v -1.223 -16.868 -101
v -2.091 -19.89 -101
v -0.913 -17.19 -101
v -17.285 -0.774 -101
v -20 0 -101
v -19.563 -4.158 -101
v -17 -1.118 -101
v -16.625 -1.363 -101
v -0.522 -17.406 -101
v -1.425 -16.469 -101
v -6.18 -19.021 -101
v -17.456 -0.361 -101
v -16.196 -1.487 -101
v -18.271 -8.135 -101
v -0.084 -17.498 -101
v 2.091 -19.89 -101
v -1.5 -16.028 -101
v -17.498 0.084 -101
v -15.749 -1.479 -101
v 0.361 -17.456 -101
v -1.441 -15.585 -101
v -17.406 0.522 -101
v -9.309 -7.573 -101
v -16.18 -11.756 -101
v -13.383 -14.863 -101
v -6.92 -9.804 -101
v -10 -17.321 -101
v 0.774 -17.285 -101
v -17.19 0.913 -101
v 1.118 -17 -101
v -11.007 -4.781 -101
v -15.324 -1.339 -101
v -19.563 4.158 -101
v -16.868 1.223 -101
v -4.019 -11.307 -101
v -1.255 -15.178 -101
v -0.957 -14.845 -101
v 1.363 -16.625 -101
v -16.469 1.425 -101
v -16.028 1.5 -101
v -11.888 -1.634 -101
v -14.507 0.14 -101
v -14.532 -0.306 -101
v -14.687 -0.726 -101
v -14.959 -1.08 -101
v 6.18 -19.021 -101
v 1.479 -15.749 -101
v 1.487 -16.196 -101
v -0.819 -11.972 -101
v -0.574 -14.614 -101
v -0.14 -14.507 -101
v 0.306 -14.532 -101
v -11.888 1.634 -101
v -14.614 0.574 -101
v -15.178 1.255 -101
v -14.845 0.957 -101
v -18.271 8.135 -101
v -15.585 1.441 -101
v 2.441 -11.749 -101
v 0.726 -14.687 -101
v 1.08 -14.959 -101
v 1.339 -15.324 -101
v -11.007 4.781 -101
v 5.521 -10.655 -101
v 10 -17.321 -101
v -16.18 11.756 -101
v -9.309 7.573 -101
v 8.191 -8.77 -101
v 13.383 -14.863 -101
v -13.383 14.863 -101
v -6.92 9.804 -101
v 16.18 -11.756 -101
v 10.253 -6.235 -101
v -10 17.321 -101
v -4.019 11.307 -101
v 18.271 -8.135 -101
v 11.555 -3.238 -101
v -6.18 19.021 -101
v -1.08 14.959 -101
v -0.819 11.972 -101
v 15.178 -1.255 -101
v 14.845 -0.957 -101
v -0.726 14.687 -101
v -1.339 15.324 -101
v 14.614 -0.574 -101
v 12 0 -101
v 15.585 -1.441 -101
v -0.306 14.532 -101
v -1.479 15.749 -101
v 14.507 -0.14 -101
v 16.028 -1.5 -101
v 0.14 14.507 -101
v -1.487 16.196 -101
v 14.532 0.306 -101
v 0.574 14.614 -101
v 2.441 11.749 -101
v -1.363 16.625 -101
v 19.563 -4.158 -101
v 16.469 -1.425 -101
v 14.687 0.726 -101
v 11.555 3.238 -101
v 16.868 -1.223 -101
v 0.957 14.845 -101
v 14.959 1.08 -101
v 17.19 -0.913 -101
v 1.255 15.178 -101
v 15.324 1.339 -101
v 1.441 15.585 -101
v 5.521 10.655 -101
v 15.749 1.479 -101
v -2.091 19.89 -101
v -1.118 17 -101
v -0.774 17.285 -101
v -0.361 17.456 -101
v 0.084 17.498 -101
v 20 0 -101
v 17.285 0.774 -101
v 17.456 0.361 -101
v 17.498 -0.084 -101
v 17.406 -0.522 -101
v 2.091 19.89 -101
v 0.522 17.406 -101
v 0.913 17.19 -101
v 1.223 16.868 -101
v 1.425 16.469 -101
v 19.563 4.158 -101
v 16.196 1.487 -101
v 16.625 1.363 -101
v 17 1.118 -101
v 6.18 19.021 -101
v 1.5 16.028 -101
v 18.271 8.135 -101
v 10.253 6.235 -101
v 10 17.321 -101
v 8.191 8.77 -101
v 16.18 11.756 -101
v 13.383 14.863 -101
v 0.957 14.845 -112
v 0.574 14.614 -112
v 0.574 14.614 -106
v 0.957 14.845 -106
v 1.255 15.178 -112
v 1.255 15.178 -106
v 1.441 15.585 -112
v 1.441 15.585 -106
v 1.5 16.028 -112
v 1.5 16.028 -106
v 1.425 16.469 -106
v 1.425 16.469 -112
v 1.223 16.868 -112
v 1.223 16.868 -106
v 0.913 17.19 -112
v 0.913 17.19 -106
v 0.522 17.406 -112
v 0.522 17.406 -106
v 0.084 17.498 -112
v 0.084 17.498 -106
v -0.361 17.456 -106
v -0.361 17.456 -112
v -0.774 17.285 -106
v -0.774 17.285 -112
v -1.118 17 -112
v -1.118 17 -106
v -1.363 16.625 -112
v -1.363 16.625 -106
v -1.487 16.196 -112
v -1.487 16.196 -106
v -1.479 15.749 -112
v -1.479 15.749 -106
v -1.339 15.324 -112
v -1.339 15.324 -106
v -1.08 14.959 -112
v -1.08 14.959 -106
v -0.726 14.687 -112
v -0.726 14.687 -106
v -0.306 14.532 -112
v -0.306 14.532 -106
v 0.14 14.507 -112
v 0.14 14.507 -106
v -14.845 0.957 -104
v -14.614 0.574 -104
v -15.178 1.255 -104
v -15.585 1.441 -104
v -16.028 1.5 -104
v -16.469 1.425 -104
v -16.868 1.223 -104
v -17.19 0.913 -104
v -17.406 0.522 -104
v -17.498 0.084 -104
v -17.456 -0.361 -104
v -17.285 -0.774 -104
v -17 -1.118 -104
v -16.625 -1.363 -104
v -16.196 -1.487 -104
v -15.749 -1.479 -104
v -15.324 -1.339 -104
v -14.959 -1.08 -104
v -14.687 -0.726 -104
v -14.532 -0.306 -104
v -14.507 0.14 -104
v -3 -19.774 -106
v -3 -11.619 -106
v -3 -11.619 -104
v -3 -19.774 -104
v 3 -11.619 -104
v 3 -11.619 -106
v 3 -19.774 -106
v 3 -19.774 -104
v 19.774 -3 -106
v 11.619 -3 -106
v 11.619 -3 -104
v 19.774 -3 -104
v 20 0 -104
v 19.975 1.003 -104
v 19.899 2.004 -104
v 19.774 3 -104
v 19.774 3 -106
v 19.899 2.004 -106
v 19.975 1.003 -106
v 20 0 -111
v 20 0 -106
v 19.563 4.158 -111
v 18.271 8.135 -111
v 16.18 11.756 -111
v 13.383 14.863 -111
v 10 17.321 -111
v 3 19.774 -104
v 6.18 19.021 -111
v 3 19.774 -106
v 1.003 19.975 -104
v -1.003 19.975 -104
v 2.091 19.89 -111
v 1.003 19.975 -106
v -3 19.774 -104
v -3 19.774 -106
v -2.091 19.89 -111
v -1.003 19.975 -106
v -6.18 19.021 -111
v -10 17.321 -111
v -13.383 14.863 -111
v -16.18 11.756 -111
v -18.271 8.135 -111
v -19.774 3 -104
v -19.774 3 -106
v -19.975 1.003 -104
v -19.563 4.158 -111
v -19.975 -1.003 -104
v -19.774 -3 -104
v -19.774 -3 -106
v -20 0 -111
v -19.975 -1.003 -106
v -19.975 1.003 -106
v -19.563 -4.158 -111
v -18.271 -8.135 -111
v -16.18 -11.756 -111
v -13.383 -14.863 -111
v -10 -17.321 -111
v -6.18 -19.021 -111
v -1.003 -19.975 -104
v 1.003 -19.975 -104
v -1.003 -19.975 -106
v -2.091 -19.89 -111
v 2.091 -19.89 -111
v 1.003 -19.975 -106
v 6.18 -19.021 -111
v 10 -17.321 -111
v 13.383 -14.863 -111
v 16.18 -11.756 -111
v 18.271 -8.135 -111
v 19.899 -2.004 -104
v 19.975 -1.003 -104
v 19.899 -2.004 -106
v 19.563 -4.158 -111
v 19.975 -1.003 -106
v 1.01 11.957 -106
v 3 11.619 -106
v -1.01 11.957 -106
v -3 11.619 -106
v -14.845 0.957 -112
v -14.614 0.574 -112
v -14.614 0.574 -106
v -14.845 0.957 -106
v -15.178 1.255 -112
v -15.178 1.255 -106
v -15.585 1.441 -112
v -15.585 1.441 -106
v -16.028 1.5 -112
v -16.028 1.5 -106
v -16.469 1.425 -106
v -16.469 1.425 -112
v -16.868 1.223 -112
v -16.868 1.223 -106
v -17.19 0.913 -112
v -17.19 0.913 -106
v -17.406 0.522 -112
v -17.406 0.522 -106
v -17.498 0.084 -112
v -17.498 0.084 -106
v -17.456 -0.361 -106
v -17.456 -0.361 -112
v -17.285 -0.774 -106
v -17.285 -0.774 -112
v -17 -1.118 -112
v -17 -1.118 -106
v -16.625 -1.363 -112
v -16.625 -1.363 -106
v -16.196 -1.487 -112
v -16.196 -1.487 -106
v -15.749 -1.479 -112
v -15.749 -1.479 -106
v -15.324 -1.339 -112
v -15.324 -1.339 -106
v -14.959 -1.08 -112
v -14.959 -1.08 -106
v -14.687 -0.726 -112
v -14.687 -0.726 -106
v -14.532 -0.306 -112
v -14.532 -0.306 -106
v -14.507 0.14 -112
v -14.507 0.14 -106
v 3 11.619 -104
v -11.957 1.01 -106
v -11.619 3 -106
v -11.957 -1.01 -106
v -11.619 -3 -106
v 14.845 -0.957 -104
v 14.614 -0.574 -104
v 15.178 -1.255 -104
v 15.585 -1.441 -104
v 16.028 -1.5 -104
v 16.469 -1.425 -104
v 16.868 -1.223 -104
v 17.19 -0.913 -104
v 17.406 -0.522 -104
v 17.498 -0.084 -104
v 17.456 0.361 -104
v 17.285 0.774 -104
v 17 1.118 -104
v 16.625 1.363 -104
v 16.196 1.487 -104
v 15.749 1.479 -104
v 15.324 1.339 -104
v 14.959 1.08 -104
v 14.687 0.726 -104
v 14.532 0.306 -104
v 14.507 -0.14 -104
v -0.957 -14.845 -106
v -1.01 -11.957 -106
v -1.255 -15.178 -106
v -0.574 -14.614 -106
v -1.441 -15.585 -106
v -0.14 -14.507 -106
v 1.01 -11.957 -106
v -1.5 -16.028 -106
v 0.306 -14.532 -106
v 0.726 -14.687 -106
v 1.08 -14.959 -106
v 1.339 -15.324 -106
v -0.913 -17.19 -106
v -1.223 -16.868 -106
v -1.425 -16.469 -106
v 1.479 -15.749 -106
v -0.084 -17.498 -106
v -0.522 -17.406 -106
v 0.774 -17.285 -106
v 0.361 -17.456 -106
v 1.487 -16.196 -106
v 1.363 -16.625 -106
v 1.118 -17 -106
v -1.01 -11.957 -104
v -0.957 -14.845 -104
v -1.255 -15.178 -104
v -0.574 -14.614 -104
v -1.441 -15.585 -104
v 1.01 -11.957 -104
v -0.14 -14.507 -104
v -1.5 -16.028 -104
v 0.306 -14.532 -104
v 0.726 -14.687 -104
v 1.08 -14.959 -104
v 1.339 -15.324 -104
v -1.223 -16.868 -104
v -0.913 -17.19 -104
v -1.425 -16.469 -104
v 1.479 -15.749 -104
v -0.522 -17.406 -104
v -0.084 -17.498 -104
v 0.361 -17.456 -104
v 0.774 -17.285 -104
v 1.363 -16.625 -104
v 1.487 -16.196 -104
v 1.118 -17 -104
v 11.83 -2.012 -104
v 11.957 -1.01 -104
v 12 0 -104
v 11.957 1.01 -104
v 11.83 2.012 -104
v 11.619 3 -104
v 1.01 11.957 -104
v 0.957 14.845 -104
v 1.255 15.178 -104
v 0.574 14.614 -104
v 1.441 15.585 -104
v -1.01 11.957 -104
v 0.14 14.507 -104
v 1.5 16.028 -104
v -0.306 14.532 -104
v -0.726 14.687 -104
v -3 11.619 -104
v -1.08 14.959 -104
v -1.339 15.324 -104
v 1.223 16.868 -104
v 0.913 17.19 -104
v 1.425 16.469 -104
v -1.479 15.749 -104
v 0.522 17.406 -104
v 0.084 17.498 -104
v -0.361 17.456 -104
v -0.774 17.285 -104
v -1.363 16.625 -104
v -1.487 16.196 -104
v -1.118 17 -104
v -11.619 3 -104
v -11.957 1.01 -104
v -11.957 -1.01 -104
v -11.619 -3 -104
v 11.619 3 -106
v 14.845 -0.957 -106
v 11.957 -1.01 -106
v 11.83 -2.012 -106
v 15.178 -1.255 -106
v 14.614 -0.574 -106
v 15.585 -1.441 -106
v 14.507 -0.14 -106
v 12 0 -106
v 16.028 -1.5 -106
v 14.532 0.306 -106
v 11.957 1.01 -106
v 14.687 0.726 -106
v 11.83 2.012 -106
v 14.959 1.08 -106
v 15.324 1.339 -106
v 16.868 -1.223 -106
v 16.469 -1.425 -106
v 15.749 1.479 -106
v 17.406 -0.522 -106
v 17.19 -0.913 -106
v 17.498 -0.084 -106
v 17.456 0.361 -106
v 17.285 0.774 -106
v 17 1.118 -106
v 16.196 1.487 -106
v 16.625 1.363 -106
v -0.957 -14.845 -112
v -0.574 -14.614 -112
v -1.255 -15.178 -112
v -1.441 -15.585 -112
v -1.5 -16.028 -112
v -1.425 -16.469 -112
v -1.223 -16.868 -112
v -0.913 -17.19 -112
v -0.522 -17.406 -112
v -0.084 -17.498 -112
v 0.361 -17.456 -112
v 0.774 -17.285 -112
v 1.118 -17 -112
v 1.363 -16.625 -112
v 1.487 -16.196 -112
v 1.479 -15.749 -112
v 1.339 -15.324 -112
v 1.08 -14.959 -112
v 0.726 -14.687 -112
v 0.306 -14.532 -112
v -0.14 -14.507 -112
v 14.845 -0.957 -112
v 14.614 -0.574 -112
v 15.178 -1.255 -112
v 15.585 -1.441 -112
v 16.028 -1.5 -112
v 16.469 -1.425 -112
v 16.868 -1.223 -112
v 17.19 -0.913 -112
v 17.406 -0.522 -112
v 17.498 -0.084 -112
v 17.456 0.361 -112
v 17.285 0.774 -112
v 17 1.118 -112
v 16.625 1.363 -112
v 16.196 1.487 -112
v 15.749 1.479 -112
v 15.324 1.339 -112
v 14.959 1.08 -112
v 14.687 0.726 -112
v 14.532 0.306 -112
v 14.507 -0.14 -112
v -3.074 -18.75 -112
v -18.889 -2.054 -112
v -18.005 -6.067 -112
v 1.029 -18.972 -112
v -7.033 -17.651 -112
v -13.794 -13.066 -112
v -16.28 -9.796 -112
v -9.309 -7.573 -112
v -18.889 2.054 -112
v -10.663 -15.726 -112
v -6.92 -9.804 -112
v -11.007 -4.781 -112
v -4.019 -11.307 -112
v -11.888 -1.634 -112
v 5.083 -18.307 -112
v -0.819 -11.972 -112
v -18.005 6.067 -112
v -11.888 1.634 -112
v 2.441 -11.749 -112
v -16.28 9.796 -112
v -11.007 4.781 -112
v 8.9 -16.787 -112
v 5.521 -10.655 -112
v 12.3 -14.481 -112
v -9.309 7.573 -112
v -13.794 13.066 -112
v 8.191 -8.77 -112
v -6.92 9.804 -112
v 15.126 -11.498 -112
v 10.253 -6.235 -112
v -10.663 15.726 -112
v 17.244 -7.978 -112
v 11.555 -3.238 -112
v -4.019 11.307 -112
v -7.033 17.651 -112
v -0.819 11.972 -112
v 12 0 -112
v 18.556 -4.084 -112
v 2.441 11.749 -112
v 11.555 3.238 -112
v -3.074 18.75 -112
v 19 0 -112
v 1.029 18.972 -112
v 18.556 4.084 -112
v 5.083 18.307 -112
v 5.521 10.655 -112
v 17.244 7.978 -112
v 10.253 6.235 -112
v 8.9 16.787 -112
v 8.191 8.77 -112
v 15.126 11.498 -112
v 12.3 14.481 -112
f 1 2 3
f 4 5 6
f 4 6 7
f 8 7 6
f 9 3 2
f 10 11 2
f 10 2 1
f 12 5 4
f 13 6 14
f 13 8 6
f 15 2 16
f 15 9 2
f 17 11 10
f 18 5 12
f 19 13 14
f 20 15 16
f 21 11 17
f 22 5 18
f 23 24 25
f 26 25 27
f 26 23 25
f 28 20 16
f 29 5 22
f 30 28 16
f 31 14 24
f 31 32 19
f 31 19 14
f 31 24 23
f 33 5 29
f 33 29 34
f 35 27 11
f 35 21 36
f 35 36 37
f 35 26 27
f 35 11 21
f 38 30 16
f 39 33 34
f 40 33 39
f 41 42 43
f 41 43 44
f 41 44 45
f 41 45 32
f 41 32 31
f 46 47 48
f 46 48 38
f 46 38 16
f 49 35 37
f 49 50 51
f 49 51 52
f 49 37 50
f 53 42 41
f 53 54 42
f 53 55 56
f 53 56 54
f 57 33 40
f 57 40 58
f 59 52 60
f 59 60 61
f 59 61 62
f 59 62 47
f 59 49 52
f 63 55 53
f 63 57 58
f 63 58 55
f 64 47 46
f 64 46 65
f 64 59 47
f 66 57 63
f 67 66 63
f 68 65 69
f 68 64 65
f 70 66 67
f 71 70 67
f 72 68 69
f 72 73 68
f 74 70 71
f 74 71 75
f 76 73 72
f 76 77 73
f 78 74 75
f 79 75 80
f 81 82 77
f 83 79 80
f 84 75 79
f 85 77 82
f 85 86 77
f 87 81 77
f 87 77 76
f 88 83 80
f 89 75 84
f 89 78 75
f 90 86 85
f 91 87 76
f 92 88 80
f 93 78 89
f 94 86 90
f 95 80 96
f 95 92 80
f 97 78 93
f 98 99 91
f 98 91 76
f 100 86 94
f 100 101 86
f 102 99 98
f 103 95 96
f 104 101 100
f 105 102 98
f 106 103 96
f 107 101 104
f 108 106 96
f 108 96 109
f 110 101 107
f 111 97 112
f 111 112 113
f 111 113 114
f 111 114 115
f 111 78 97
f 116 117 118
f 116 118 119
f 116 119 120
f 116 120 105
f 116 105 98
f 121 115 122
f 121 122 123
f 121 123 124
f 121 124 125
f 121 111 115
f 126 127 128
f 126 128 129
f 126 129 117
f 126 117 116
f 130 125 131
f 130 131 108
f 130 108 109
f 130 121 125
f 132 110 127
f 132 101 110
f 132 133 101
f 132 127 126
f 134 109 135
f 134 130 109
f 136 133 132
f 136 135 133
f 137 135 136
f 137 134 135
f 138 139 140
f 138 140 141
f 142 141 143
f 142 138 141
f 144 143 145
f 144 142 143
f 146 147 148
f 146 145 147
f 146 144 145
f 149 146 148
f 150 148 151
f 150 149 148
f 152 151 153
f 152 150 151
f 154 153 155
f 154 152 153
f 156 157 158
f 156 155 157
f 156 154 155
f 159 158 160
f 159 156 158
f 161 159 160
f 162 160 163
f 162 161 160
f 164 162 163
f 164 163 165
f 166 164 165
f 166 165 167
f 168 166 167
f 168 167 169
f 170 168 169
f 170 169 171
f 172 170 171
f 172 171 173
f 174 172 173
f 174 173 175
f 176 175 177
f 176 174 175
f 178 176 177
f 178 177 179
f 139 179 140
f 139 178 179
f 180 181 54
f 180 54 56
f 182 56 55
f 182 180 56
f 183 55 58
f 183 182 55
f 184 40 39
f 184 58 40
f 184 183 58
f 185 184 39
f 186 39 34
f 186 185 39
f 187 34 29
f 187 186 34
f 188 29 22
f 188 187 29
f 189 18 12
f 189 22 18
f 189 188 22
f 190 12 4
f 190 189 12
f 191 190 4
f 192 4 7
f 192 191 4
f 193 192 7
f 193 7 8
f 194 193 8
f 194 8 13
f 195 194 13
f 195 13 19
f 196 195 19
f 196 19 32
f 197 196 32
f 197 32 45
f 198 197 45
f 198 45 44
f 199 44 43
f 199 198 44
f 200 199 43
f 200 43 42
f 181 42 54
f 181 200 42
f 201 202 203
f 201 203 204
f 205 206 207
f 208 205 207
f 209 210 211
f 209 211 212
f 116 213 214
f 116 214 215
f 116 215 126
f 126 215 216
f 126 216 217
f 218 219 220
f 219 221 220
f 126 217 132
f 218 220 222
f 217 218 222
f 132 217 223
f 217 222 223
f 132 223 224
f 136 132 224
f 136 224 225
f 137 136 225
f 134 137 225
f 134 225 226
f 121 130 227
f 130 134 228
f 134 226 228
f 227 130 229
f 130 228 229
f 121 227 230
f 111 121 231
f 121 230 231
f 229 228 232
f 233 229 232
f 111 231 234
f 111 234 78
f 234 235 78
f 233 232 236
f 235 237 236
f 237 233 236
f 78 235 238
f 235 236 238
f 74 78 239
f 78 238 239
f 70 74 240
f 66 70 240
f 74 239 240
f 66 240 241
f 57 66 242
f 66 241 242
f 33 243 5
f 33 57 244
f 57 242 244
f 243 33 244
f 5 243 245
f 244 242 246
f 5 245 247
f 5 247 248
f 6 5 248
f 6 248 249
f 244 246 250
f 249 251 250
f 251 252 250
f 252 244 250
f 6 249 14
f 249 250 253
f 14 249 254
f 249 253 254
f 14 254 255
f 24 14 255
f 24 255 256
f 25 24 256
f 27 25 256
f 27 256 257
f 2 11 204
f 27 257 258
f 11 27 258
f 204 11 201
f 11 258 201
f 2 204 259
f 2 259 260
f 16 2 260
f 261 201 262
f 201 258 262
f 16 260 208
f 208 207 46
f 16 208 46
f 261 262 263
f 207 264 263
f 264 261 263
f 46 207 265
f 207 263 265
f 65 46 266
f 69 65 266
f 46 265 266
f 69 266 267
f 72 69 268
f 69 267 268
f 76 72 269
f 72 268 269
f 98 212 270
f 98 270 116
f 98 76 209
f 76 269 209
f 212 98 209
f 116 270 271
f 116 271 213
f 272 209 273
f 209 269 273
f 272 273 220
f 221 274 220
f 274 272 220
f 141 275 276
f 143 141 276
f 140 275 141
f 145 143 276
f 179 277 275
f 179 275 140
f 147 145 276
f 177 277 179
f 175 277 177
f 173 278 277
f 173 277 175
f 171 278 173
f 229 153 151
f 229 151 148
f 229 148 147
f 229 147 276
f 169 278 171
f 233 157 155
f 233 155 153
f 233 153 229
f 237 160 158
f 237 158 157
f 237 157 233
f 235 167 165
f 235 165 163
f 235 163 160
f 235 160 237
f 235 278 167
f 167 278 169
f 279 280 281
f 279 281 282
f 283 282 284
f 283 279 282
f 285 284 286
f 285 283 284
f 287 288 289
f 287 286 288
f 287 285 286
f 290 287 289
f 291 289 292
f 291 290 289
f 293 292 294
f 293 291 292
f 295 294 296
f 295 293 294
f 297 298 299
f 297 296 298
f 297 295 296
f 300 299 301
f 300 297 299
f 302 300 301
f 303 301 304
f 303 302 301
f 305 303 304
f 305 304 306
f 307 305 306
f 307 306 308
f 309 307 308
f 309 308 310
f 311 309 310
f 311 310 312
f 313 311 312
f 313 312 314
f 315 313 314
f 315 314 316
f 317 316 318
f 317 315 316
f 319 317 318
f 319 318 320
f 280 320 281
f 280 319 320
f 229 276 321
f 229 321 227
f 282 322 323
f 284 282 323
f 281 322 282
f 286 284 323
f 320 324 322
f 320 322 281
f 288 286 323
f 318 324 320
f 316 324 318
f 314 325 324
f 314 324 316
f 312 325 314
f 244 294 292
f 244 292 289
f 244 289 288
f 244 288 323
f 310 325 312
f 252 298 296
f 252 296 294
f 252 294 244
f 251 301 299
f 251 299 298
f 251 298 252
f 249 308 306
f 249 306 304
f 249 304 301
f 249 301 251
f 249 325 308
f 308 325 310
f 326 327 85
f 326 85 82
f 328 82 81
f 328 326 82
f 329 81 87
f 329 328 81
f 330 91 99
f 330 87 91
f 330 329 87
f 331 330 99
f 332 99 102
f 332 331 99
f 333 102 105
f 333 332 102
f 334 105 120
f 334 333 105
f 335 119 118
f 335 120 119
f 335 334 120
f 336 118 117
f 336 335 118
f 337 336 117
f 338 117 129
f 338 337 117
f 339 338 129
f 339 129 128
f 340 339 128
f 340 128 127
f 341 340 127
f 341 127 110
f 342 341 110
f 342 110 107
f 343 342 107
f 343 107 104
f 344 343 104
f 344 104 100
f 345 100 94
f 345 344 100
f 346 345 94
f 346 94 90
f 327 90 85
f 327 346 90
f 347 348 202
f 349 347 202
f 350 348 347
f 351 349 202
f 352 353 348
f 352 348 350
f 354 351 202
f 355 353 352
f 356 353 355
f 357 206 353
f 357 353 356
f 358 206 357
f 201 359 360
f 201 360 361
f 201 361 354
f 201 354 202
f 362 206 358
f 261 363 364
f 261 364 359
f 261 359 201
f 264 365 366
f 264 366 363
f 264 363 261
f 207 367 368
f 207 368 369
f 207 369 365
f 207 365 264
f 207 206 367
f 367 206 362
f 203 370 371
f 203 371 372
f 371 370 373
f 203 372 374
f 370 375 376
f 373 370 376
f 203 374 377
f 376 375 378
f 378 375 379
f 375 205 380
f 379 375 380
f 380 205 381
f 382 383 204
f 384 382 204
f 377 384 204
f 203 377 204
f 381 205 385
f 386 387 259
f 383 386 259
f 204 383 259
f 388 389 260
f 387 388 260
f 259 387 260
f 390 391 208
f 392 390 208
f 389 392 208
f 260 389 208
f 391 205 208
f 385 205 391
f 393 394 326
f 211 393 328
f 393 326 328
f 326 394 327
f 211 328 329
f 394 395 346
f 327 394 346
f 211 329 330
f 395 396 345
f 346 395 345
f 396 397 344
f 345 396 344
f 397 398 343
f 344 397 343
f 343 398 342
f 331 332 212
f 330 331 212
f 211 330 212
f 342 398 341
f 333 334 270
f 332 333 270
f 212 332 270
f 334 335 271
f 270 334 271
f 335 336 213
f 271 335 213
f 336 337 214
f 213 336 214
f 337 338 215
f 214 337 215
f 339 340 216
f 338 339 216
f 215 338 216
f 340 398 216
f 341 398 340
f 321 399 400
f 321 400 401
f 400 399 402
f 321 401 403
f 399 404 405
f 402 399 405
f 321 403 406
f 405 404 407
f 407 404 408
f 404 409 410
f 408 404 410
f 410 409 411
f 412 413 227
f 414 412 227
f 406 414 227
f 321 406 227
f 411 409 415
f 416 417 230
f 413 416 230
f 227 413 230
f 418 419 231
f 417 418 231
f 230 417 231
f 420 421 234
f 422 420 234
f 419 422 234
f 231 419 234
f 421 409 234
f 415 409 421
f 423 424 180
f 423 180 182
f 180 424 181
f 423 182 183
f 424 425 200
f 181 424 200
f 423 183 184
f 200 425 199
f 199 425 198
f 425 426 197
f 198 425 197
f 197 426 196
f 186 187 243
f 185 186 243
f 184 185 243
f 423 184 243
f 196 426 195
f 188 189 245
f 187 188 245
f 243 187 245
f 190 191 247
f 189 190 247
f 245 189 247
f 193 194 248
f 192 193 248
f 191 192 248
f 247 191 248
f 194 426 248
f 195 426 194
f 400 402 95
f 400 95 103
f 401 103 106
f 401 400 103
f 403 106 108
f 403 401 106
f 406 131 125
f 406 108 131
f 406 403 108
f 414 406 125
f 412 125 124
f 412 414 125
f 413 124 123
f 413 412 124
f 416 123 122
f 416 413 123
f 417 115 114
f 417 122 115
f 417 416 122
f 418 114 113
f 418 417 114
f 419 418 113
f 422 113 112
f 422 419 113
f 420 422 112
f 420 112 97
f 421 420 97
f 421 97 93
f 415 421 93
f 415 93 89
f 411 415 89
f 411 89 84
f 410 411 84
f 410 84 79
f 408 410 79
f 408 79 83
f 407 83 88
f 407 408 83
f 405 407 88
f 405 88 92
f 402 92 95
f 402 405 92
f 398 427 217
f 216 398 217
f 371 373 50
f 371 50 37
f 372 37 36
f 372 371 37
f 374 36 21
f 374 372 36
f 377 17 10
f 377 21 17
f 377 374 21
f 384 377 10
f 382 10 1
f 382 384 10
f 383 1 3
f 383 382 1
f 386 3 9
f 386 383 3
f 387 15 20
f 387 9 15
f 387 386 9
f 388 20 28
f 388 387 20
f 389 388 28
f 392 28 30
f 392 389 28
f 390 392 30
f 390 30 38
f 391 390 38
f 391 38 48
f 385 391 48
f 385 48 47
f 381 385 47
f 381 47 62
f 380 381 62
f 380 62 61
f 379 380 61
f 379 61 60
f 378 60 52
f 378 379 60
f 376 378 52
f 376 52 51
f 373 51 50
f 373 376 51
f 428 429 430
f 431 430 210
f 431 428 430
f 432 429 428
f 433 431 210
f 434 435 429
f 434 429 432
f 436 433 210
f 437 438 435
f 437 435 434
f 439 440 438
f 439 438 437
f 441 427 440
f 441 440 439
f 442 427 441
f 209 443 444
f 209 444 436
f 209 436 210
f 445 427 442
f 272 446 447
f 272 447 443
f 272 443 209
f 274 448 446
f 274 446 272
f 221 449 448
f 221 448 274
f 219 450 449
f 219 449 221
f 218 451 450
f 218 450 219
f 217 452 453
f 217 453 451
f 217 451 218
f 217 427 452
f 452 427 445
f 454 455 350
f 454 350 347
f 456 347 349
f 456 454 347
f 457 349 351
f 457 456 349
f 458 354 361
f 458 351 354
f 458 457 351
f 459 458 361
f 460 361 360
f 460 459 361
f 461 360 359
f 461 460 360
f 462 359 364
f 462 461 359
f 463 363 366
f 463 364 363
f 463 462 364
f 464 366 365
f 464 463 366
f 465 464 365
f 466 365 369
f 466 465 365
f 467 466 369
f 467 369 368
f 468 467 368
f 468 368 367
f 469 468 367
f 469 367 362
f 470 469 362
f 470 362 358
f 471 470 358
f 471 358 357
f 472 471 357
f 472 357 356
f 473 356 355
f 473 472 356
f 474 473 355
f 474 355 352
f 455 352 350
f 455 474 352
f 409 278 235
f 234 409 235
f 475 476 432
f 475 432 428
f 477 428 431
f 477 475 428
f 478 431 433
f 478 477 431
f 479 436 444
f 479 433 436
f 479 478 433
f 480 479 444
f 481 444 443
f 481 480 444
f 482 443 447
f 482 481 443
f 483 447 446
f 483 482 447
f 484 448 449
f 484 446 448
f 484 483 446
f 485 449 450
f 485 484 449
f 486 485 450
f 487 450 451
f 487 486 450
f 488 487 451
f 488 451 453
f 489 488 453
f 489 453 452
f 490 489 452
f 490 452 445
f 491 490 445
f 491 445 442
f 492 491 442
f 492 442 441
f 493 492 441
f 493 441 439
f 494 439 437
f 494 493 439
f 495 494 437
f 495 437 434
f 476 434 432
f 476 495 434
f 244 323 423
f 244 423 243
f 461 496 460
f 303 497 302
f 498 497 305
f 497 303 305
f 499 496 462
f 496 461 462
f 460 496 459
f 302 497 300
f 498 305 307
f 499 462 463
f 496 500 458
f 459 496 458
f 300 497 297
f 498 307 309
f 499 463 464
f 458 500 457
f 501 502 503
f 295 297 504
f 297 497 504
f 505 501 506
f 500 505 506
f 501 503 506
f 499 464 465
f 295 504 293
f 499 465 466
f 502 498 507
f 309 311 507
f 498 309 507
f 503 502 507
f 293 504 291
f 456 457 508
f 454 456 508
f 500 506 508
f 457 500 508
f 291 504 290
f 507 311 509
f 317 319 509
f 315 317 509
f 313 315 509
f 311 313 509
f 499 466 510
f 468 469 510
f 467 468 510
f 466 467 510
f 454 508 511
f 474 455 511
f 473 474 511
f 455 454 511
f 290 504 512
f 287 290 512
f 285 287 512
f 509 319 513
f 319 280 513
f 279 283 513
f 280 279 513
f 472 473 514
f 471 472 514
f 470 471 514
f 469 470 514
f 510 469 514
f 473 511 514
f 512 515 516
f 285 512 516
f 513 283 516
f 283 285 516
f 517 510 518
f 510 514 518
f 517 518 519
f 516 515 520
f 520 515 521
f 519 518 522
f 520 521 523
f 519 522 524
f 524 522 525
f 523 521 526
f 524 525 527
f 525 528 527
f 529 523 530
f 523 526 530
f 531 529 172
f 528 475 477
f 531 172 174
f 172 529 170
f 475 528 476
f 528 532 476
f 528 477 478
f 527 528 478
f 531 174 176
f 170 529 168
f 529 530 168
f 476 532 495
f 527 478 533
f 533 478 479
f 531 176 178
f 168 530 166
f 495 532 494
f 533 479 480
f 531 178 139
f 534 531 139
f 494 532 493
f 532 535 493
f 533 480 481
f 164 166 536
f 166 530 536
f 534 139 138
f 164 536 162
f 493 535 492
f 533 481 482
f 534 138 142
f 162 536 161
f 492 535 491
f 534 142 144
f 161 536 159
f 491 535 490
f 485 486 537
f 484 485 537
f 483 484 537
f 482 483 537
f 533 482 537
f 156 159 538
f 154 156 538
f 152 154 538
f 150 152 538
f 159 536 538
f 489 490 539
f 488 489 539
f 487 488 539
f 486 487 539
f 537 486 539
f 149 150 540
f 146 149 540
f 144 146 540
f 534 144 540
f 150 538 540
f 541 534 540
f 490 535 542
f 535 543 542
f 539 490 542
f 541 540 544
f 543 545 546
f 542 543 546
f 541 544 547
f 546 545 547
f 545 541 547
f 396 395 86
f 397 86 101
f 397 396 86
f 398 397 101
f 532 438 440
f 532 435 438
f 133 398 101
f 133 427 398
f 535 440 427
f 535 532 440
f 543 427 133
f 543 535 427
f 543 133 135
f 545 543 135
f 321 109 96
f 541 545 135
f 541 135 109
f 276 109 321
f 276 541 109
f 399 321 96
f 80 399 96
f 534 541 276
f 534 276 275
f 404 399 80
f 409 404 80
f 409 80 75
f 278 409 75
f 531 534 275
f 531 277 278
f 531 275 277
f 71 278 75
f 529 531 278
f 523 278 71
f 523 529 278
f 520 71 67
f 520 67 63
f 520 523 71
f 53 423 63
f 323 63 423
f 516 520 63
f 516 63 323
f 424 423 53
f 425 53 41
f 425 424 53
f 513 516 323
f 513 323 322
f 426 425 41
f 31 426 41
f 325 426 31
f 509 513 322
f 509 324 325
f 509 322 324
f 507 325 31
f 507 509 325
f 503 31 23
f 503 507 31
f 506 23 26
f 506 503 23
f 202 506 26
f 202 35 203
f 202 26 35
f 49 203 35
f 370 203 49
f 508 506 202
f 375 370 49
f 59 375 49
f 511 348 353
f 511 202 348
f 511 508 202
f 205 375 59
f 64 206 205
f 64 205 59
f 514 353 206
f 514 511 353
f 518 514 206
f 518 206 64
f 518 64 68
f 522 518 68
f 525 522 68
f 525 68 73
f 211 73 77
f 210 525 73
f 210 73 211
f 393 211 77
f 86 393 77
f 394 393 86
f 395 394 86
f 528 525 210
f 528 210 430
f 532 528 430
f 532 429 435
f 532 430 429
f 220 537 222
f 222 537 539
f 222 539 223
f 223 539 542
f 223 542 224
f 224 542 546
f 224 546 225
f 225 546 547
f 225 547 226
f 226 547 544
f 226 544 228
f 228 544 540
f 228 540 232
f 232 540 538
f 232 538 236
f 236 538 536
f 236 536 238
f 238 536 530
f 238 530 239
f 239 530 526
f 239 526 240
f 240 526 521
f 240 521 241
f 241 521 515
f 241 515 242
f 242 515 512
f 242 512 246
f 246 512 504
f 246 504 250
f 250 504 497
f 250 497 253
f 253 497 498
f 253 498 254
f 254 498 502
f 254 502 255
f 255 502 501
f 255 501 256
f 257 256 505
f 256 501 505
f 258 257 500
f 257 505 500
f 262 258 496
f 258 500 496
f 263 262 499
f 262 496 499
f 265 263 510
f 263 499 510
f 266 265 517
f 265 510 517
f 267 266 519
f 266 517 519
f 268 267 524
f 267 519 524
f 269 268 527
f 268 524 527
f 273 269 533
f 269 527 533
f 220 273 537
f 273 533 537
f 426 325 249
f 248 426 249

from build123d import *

# Parameters (mm, degrees)
BOX106_W                    = 10
BOX106_H                    = 6
BOX106_DEPTH                = 2
BOX105_W                    = 10
BOX105_H                    = 6
BOX105_DEPTH                = 2
BOX107_W                    = 10
BOX107_H                    = 6
BOX107_DEPTH                = 2
BOX104_W                    = 10
BOX104_H                    = 6
BOX104_DEPTH                = 2
CYLINDER279_R               = 1.5
CYLINDER279_DEPTH           = 16
CYLINDER279_PLACEMENT_ANGLE = 67.5
CYLINDER277_R               = 1.5
CYLINDER277_DEPTH           = 16
CYLINDER277_PLACEMENT_ANGLE = 22.5
CYLINDER278_R               = 1.5
CYLINDER278_DEPTH           = 16
CYLINDER278_PLACEMENT_ANGLE = 112.5
CYLINDER276_R               = 1.5
CYLINDER276_DEPTH           = 16
CYLINDER276_PLACEMENT_ANGLE = 202.5
TUBE031_R                   = 20
TUBE031_R_2                 = 12
TUBE031_DEPTH               = 11
CHAMFER004_SIZE             = 1


with BuildPart() as krychle106:
    # Box106 → Box106 (new body)
    with BuildSketch(Plane(origin=(3, 11, 6), x_dir=(0, 1, 0), z_dir=(0, 0, 1))):
        with Locations((5, 3)):
            Rectangle(BOX106_W, BOX106_H)
    extrude(amount=BOX106_DEPTH)


with BuildPart() as krychle105:
    # Box105 → Box105 (new body)
    with BuildSketch(Plane(origin=(-11, 3, 6), x_dir=(-1, 0, 0), z_dir=(0, 0, 1))):
        with Locations((5, 3)):
            Rectangle(BOX105_W, BOX105_H)
    extrude(amount=BOX105_DEPTH)


with BuildPart() as krychle107:
    # Box107 → Box107 (new body)
    with BuildSketch(Plane(origin=(-3, -11, 6), x_dir=(0, -1, 0), z_dir=(0, 0, 1))):
        with Locations((5, 3)):
            Rectangle(BOX107_W, BOX107_H)
    extrude(amount=BOX107_DEPTH)


with BuildPart() as compound232:
    # Box104 → Box104 (new body)
    with BuildSketch(Plane(origin=(11, -3, 6), x_dir=(1, 0, 0), z_dir=(0, 0, 1))):
        with Locations((5, 3)):
            Rectangle(BOX104_W, BOX104_H)
    extrude(amount=BOX104_DEPTH)

    # Compound232: union Krychle106, Krychle105, Krychle107
    add(krychle106.part)
    add(krychle105.part)
    add(krychle107.part)


with BuildPart() as compound232_1:
    # Compound232 placement: moved
    add(compound232.part.moved(Location((0, 0, -111))))


with BuildPart() as v_lec279:
    # Cylinder279 → Cylinder279 (new body)
    with BuildSketch(Plane.XY):
        Circle(CYLINDER279_R)
    extrude(amount=CYLINDER279_DEPTH)


with BuildPart() as v_lec279_1:
    # Cylinder279 placement: moved
    add(v_lec279.part.moved(Location((0, 16, 2))).rotate(Axis((0, 16, 2), (0, 0, -1)), CYLINDER279_PLACEMENT_ANGLE))


with BuildPart() as v_lec277:
    # Cylinder277 → Cylinder277 (new body)
    with BuildSketch(Plane.XY):
        Circle(CYLINDER277_R)
    extrude(amount=CYLINDER277_DEPTH)


with BuildPart() as v_lec277_1:
    # Cylinder277 placement: moved
    add(v_lec277.part.moved(Location((-16, 0, 2))).rotate(Axis((-16, 0, 2), (0, 0, 1)), CYLINDER277_PLACEMENT_ANGLE))


with BuildPart() as v_lec278:
    # Cylinder278 → Cylinder278 (new body)
    with BuildSketch(Plane.XY):
        Circle(CYLINDER278_R)
    extrude(amount=CYLINDER278_DEPTH)


with BuildPart() as v_lec278_1:
    # Cylinder278 placement: moved
    add(v_lec278.part.moved(Location((0, -16, 2))).rotate(Axis((0, -16, 2), (0, 0, 1)), CYLINDER278_PLACEMENT_ANGLE))


with BuildPart() as compound234:
    # Cylinder276 → Cylinder276 (new body)
    with BuildSketch(Plane.XY):
        Circle(CYLINDER276_R)
    extrude(amount=CYLINDER276_DEPTH)


with BuildPart() as compound234_1:
    # Cylinder276 placement: moved
    add(compound234.part.moved(Location((16, 0, 2))).rotate(Axis((16, 0, 2), (0, 0, 1)), CYLINDER276_PLACEMENT_ANGLE))

    # Compound234: union Válec279, Válec277, Válec278
    add(v_lec279_1.part)
    add(v_lec277_1.part)
    add(v_lec278_1.part)


with BuildPart() as compound234_2:
    # Compound234 placement: moved
    add(compound234_1.part.moved(Location((0, 0, -117))))


with BuildPart() as chamfer004:
    # Tube031 → Tube031 (new body)
    with BuildSketch(Plane.XY.offset(-111)):
        Circle(TUBE031_R)
        Circle(TUBE031_R_2, mode=Mode.SUBTRACT)
    extrude(amount=TUBE031_DEPTH)

    # Cut123: cut Compound234
    add(compound234_2.part, mode=Mode.SUBTRACT)

    # Cut126: cut Compound232
    add(compound232_1.part, mode=Mode.SUBTRACT)

    # Chamfer004
    chamfer004_edges = [chamfer004.edges().sort_by_distance(p)[0] for p in [
        (-20, 0, -111),
    ]]
    chamfer(chamfer004_edges, length=CHAMFER004_SIZE)


with BuildPart() as chamfer004_1:
    # Chamfer004 placement: moved
    add(chamfer004.part.moved(Location((0, 0, -1))))


solid = chamfer004_1.part
